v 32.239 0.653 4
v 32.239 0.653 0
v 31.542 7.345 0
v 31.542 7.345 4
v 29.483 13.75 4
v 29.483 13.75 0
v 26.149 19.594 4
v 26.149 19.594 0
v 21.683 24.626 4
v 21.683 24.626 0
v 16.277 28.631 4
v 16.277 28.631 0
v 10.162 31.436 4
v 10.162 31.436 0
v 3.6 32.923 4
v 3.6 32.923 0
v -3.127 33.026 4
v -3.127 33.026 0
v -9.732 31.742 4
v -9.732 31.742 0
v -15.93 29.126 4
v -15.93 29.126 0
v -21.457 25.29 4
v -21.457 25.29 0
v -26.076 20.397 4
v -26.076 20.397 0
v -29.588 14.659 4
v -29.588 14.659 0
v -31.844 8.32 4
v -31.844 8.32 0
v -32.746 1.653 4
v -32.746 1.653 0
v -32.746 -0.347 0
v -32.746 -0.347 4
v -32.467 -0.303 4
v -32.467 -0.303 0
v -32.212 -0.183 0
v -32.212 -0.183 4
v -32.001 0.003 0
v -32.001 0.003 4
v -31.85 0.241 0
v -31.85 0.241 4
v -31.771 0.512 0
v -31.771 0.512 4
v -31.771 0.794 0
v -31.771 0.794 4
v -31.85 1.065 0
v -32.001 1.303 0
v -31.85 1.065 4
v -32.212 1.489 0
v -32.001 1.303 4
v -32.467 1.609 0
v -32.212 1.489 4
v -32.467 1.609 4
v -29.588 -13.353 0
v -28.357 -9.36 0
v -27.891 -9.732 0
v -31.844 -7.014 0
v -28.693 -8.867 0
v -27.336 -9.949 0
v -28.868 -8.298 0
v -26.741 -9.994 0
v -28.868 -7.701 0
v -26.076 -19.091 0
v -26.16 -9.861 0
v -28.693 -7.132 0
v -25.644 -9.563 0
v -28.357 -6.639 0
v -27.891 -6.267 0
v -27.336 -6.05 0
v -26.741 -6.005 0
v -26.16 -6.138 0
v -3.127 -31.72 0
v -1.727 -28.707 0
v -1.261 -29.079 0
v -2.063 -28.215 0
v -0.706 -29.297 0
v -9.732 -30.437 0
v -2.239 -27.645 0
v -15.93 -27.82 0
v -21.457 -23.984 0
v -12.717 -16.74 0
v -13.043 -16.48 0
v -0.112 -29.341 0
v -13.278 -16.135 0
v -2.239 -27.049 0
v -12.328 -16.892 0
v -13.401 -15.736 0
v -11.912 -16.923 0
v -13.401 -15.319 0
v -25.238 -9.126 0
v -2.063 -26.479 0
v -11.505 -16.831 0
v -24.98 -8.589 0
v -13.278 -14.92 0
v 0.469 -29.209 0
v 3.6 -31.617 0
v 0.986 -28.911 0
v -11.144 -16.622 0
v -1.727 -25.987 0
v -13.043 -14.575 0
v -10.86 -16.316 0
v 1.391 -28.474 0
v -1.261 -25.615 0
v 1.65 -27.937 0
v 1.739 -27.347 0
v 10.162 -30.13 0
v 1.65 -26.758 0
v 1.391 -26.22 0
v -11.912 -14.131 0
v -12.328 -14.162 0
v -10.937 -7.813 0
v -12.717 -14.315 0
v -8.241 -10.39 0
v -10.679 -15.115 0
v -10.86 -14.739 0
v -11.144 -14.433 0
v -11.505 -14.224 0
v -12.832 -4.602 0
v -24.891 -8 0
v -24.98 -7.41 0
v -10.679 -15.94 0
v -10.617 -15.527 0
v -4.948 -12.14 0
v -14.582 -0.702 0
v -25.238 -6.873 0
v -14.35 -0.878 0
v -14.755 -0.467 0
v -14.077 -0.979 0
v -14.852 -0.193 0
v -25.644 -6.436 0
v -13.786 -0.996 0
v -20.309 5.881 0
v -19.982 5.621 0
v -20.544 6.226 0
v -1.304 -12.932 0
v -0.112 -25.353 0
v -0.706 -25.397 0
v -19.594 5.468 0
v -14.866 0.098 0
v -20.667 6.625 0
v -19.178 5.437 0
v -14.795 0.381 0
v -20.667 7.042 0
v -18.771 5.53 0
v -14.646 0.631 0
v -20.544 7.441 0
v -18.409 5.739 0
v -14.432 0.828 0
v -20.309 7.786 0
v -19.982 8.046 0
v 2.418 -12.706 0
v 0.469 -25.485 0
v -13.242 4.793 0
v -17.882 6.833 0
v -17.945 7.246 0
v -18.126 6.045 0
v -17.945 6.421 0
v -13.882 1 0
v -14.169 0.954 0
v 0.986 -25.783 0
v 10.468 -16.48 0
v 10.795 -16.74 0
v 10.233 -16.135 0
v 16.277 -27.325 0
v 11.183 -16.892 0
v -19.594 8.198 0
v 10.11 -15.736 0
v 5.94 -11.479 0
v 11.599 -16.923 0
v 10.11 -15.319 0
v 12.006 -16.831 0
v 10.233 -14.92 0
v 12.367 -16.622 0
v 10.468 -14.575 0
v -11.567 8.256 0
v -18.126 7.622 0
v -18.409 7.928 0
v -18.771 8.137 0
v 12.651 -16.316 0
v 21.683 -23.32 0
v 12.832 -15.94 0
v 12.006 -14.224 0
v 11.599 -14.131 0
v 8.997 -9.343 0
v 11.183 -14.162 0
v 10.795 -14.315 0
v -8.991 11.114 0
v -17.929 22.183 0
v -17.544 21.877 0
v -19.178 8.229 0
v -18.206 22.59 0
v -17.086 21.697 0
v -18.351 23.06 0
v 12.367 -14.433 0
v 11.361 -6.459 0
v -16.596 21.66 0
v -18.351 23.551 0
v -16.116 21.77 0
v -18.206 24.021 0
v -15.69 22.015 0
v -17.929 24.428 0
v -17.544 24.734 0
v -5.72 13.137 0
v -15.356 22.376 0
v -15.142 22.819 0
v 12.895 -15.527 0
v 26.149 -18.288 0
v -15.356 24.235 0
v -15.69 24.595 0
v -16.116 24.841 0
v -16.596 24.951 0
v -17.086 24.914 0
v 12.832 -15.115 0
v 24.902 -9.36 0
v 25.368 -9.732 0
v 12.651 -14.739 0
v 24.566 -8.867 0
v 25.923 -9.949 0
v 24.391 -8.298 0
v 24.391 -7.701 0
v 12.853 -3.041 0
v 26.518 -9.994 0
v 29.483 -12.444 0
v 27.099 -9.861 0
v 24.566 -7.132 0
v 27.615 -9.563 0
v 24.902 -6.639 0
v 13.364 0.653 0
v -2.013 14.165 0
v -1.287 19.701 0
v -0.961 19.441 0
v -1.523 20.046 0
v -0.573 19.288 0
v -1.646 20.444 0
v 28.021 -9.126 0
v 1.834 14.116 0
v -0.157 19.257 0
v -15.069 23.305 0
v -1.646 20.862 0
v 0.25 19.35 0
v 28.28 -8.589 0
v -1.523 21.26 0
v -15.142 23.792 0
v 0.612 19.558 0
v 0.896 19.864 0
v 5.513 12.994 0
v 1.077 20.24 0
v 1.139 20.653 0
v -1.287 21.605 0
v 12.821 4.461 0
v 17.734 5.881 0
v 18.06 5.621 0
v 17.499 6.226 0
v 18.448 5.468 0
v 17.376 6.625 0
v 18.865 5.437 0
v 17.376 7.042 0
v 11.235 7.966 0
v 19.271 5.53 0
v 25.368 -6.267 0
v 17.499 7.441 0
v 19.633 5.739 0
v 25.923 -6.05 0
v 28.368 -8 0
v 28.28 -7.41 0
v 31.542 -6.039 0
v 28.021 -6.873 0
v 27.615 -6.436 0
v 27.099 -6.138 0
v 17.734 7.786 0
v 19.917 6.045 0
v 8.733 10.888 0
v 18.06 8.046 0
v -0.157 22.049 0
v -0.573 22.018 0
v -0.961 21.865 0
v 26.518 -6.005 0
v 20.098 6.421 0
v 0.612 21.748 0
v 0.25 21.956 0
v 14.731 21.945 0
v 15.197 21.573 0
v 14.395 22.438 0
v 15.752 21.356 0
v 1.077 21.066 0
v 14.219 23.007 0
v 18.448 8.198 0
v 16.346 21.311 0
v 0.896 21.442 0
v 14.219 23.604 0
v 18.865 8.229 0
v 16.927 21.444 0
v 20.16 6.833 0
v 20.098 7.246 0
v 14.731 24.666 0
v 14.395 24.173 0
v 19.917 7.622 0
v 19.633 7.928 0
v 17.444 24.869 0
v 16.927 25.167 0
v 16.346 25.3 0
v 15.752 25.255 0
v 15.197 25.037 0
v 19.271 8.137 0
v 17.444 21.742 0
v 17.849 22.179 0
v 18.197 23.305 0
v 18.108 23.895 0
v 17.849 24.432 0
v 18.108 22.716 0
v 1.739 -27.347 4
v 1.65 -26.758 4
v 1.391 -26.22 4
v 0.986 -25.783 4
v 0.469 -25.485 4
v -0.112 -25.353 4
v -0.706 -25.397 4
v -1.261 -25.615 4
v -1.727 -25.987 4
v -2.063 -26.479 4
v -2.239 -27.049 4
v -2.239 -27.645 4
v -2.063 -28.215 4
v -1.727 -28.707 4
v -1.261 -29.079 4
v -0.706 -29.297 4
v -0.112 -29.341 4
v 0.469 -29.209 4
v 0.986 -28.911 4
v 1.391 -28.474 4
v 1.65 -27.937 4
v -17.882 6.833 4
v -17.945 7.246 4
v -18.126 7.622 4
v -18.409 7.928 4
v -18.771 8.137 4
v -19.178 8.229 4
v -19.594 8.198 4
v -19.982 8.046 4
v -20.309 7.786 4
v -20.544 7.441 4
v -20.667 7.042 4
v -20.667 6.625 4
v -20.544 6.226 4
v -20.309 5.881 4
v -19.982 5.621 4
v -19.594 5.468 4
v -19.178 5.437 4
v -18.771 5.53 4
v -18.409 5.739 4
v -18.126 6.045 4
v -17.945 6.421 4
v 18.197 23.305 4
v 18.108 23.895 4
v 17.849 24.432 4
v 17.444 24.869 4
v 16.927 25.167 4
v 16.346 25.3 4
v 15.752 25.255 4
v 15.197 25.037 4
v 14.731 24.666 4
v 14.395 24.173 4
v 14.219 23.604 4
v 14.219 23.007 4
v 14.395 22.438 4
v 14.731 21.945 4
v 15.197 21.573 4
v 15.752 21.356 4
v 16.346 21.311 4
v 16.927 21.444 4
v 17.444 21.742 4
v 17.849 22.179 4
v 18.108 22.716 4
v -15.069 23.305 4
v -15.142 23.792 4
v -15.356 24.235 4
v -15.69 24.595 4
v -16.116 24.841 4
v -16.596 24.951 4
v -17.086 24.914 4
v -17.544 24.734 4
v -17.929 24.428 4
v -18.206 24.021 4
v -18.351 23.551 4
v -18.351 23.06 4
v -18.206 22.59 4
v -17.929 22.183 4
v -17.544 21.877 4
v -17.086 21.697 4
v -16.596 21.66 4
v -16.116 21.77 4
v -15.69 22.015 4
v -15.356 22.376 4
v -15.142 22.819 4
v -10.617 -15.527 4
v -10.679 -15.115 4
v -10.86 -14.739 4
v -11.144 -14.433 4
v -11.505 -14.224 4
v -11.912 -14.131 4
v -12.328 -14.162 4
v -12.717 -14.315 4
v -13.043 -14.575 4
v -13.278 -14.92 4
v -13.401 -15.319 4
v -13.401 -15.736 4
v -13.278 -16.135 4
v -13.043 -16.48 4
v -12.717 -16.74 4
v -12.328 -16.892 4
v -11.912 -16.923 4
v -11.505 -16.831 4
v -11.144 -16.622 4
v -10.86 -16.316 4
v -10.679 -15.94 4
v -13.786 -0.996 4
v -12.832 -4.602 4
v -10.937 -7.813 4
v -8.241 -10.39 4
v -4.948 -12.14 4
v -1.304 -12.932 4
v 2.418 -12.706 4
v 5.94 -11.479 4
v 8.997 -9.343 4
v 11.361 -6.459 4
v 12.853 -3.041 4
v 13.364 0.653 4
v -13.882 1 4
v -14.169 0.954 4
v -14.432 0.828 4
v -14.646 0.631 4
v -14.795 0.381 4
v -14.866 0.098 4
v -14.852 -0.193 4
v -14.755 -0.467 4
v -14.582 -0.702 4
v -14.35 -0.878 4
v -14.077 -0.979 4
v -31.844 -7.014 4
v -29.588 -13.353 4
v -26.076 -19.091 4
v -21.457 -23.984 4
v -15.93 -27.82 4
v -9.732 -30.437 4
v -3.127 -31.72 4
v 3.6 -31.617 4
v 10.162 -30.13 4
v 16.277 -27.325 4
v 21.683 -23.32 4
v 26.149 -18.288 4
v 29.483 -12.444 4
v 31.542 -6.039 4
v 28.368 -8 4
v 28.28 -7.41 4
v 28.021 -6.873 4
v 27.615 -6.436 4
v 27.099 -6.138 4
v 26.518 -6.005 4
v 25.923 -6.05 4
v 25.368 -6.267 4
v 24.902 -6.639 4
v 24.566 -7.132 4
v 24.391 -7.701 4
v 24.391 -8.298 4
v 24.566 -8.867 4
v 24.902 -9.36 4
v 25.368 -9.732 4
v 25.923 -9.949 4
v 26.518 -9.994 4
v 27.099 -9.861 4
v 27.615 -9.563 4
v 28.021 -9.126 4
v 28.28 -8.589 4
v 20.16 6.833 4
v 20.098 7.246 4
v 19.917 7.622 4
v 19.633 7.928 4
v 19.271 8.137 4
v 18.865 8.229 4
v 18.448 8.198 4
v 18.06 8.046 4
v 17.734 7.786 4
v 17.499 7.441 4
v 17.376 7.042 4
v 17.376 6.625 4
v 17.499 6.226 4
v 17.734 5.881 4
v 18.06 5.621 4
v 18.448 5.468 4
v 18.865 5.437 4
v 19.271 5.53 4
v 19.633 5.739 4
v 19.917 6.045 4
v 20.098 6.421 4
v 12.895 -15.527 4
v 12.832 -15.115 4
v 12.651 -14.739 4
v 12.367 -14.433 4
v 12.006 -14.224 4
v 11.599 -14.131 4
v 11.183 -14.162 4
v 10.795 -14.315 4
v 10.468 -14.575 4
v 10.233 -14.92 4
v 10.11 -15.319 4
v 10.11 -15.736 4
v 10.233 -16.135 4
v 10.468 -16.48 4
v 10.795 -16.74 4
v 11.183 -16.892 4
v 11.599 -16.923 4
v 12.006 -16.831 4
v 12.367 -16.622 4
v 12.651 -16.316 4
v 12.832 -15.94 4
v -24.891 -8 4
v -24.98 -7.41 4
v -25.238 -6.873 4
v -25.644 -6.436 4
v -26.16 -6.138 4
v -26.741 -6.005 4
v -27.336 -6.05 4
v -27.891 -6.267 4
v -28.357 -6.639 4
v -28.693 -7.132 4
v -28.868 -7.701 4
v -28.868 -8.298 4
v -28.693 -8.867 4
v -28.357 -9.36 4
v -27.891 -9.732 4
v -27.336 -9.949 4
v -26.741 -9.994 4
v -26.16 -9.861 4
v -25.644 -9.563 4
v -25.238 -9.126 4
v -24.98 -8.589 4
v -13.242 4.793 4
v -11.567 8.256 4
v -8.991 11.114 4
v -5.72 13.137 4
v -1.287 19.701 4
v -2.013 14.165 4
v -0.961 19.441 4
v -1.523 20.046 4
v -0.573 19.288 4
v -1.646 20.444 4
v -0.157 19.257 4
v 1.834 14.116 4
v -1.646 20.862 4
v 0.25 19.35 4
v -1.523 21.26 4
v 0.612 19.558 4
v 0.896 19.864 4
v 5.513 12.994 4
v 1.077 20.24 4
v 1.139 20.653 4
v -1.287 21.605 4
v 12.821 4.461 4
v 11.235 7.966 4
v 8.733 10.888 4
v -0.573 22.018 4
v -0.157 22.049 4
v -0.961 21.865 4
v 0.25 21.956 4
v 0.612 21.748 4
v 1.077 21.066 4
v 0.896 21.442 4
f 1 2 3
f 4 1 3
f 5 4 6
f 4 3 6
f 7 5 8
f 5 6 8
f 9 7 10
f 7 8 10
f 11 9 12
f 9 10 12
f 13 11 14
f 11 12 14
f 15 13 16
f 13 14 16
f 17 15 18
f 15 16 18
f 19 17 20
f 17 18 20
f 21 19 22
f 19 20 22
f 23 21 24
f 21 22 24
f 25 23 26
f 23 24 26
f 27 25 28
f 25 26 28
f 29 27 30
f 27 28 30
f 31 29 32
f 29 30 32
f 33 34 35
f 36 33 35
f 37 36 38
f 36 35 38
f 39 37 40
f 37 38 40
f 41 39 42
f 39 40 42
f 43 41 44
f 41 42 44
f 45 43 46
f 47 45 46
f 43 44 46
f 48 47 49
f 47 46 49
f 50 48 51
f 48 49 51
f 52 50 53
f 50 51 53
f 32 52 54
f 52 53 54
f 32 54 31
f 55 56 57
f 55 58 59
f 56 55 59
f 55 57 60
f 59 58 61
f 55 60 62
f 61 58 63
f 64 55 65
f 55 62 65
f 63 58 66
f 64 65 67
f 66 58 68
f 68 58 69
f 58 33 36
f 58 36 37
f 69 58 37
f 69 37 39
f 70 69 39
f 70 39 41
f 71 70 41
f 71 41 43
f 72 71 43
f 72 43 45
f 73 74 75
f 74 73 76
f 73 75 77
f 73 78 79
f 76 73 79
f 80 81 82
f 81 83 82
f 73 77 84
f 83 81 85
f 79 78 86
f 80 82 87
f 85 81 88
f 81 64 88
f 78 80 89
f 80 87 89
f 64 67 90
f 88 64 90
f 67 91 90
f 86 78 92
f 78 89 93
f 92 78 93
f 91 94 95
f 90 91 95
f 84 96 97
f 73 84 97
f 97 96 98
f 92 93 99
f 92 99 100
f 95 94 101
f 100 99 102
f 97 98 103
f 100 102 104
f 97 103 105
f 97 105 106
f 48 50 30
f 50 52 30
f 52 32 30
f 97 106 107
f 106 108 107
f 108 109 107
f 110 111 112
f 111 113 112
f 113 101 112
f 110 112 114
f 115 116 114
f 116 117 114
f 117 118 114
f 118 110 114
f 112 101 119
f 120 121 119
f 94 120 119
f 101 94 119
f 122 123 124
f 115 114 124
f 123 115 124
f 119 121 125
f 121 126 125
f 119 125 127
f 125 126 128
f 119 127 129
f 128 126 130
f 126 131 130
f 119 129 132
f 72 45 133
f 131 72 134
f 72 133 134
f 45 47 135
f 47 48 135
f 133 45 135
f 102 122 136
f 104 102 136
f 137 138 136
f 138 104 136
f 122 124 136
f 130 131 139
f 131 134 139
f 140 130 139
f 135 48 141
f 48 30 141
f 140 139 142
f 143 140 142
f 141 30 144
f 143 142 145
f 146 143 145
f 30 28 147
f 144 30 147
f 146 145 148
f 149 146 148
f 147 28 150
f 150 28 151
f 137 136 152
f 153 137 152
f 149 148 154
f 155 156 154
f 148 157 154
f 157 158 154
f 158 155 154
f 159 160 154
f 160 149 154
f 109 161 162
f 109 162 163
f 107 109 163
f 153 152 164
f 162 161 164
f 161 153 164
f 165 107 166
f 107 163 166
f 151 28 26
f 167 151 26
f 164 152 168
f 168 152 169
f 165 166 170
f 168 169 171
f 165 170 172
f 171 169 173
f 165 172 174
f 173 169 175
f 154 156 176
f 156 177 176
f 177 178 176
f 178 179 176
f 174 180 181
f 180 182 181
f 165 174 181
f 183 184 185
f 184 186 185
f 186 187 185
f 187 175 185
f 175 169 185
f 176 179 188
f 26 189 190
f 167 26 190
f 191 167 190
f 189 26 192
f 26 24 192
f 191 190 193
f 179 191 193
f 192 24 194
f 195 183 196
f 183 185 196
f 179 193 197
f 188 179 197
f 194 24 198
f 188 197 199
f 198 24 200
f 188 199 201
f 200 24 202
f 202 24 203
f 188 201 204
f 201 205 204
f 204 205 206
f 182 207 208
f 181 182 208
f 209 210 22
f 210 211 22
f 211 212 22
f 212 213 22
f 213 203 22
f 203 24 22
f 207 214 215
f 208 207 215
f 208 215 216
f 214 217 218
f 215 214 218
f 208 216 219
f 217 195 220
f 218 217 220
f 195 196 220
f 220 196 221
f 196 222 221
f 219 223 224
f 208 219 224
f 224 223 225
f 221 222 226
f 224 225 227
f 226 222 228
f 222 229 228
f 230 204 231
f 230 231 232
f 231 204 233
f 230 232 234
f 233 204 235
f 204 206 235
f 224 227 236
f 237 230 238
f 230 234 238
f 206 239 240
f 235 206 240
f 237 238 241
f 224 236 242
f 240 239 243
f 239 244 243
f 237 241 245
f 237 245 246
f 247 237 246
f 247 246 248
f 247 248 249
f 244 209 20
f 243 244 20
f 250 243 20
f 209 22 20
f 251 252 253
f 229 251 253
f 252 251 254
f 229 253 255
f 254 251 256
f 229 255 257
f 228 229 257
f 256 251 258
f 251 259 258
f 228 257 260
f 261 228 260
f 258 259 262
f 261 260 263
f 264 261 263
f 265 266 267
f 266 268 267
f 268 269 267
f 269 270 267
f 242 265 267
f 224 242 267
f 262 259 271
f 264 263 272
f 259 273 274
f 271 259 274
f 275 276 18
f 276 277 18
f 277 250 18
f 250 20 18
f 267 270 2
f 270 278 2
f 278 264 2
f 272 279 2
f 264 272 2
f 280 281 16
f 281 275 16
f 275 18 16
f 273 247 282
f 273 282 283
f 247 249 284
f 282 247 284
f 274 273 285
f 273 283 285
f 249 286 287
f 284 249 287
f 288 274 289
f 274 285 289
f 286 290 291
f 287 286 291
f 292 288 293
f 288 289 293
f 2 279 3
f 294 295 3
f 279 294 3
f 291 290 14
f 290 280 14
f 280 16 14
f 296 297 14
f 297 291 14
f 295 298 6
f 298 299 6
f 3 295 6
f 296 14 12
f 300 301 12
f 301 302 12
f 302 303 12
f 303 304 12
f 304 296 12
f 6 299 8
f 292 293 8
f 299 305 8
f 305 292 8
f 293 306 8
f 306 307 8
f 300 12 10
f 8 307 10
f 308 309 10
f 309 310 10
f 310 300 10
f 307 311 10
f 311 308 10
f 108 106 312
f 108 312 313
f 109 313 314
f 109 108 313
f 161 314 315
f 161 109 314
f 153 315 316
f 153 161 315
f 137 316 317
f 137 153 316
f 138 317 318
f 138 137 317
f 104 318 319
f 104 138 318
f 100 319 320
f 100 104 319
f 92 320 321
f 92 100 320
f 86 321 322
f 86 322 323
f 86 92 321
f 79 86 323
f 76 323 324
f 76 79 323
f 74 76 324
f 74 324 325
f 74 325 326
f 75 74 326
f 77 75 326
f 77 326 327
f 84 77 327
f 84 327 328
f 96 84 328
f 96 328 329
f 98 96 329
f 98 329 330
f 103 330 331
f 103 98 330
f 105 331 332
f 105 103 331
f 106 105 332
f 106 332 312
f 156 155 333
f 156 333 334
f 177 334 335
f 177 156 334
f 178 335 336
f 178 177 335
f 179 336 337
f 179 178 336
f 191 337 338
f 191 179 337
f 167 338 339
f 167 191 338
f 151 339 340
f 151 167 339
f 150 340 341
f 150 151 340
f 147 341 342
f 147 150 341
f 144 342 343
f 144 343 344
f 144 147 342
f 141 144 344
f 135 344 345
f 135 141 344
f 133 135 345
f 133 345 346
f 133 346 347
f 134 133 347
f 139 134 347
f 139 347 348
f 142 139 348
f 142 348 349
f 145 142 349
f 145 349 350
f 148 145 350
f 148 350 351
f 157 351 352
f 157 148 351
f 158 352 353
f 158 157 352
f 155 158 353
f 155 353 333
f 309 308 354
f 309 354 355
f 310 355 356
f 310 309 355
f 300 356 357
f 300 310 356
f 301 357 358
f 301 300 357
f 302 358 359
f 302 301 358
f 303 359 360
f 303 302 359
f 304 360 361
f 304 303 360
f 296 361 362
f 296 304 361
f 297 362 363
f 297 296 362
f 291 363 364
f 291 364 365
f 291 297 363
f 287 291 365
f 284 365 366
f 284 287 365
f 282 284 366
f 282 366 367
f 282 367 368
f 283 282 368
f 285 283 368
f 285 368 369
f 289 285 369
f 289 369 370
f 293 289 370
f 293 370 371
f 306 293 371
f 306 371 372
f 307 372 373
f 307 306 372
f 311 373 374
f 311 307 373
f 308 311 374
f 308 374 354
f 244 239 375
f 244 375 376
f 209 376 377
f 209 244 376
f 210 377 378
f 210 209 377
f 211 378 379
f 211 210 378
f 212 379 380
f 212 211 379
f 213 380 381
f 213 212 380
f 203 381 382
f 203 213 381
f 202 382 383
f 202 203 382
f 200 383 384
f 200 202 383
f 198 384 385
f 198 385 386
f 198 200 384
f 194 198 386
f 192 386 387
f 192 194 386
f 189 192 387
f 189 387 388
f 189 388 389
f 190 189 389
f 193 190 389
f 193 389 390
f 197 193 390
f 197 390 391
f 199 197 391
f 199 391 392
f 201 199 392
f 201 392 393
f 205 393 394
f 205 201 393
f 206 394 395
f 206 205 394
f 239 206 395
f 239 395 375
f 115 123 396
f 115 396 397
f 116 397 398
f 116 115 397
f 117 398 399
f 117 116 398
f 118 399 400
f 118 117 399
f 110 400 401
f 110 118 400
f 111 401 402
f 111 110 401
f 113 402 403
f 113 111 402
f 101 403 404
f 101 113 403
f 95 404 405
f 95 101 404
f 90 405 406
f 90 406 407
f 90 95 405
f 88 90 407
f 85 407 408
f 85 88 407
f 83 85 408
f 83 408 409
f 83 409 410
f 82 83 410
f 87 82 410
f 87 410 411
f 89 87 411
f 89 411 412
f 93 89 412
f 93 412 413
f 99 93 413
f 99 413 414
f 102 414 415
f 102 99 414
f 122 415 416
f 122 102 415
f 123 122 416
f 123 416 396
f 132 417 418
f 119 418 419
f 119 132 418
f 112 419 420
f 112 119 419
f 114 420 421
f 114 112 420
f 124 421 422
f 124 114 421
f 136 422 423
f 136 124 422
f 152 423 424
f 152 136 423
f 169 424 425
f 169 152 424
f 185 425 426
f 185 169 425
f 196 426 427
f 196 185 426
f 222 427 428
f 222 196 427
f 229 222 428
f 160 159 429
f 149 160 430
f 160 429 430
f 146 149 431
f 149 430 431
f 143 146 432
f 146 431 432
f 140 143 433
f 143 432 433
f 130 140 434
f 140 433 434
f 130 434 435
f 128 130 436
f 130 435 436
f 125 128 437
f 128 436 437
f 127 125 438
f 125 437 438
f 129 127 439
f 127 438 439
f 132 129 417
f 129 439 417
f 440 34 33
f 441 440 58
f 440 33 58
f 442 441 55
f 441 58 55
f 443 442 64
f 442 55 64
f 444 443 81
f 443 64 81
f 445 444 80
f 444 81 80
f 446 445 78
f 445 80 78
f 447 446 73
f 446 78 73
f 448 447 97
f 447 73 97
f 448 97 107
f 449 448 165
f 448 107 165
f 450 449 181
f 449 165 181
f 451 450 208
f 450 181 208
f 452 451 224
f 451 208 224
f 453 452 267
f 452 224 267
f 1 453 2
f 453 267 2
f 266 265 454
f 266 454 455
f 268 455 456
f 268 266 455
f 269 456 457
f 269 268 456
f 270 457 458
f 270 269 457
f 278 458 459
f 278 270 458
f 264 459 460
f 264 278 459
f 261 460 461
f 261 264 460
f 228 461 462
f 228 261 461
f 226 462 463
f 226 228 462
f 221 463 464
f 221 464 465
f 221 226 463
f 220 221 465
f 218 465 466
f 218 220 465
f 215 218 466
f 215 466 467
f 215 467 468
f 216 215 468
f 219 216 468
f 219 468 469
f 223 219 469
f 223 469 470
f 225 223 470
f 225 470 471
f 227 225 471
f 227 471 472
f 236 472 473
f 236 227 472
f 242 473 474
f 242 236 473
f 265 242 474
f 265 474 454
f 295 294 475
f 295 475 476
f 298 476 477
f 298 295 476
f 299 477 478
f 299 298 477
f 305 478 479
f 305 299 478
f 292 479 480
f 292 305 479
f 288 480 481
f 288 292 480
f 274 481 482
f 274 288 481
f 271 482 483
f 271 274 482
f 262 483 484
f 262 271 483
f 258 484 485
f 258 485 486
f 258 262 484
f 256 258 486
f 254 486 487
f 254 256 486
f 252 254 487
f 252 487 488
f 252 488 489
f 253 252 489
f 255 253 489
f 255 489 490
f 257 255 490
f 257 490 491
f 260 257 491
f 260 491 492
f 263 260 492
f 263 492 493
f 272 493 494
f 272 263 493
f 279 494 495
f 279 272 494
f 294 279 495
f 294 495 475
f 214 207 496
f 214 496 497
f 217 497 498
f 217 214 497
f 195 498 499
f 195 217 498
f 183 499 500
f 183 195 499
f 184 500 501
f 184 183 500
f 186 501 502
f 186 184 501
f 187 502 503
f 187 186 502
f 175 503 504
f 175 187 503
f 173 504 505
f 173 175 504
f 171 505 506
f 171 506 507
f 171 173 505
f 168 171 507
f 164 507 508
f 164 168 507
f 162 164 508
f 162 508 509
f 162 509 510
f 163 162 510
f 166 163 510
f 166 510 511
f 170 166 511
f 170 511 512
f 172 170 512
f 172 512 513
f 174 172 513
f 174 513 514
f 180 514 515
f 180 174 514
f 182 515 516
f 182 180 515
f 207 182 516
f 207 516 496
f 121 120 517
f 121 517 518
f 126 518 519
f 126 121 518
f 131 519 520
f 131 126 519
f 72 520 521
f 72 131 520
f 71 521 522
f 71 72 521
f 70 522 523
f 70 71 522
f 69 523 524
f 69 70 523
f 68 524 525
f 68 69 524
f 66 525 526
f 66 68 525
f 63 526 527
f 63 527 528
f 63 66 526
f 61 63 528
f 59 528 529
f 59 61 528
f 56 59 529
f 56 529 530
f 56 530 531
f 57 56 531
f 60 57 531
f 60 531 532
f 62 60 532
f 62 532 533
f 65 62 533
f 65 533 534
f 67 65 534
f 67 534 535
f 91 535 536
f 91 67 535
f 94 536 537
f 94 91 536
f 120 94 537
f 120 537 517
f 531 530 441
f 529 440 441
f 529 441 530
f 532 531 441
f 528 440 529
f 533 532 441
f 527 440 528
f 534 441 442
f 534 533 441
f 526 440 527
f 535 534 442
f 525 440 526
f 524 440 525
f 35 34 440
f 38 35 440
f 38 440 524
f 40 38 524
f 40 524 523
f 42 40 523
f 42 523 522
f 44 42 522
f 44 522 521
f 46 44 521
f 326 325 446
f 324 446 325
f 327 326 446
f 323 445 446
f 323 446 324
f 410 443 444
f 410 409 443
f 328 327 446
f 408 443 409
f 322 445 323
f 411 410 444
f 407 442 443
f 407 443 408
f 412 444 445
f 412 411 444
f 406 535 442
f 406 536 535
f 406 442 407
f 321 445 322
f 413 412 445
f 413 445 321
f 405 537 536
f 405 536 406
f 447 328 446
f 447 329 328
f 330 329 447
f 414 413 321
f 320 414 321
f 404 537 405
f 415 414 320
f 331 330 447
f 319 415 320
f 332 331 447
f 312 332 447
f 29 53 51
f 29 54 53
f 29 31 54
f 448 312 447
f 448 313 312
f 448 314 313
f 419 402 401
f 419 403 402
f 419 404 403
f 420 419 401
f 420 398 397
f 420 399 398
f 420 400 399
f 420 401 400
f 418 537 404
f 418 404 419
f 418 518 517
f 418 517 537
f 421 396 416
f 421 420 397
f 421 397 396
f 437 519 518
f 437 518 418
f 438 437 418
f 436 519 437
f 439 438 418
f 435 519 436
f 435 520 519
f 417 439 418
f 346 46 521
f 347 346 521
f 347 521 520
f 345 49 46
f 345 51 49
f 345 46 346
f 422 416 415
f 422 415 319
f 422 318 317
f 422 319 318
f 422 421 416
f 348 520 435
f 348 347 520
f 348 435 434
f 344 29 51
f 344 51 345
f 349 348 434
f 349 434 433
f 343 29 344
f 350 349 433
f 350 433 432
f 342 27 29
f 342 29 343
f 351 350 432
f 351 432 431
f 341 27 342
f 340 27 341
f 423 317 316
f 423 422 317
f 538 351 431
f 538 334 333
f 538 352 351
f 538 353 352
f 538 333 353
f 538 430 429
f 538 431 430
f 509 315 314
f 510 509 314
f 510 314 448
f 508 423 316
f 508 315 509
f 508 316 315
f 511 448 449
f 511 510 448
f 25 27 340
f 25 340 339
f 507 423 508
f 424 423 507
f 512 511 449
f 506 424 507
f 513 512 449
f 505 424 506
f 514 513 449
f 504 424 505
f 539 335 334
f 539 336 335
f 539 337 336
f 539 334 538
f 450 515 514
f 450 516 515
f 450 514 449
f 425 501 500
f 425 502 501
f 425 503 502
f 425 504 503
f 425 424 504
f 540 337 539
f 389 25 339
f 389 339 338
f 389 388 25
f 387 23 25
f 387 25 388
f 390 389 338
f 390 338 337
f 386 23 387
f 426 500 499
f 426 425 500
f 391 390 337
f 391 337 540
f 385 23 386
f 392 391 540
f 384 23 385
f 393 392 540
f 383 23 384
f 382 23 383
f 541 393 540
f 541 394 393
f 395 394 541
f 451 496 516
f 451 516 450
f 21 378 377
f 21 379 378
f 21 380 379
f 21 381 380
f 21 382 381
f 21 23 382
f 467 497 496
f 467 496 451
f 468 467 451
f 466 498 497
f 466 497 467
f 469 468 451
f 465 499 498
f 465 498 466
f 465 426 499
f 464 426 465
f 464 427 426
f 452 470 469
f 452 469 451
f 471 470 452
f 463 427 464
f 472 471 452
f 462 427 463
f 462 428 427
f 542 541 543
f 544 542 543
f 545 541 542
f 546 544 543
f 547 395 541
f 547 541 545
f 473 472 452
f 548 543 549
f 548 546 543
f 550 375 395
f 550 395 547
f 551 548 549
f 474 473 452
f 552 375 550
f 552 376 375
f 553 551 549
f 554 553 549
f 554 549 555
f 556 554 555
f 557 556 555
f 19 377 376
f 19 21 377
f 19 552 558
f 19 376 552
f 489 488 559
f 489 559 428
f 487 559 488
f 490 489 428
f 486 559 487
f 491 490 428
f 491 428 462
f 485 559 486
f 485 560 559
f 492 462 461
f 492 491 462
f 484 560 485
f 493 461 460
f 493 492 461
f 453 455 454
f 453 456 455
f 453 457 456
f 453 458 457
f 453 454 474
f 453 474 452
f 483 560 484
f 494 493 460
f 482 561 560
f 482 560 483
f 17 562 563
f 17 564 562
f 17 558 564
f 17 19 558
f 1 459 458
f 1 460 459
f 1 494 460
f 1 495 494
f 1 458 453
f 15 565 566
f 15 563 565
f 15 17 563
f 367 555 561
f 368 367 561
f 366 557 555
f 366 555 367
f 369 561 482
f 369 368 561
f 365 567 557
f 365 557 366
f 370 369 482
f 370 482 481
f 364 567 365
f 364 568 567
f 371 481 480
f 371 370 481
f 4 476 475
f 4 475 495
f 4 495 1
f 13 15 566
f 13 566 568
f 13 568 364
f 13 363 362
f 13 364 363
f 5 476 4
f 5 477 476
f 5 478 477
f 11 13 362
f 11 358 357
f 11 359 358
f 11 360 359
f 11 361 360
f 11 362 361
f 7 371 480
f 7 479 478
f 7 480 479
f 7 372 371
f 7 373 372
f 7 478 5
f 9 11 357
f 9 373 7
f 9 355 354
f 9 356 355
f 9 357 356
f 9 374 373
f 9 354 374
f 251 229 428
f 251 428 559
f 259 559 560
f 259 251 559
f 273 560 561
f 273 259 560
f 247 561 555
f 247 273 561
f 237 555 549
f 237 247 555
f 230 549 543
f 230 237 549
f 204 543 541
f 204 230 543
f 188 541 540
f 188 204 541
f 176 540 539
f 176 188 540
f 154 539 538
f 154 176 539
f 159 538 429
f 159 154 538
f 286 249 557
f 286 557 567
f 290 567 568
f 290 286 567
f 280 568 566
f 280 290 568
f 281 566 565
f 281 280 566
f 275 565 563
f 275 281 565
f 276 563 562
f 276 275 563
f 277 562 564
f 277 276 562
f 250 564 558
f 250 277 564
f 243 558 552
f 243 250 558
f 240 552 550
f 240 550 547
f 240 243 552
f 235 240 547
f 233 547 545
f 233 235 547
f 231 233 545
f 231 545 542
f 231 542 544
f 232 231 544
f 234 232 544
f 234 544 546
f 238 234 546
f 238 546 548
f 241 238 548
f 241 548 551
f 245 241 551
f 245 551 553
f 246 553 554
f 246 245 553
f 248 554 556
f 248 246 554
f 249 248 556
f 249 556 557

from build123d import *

# Parameters (mm, degrees)
SKETCH_1_R          = 32.5
SKETCH_1_R_2        = 13.625
SKETCH_1_R_3        = 2
SKETCH_1_R_4        = 1.65
SKETCH_1_R_5        = 1.4
EXTRUDE_1_DEPTH     = 4
SKETCH_2_R          = 1
CUT_EXTRUDE_1_DEPTH = 10


with BuildPart() as part:
    # 草图1 → 凸台-拉伸1 (new body)
    with BuildSketch(Plane.XY):
        with Locations((-0.261189045, 0.652972612)):
            Circle(SKETCH_1_R)
        with Locations((-0.261189045, 0.652972612)):
            Circle(SKETCH_1_R_2, mode=Mode.SUBTRACT)
        with Locations((-0.261189045, -27.347027388)):
            Circle(SKETCH_1_R_3, mode=Mode.SUBTRACT)
        with Locations((-26.890771501, -7.999503231)):
            Circle(SKETCH_1_R_3, mode=Mode.SUBTRACT)
        with Locations((-16.719176109, 23.305448454)):
            Circle(SKETCH_1_R_4, mode=Mode.SUBTRACT)
        with Locations((16.196798019, 23.305448454)):
            Circle(SKETCH_1_R_3, mode=Mode.SUBTRACT)
        with Locations((26.368393412, -7.999503231)):
            Circle(SKETCH_1_R_3, mode=Mode.SUBTRACT)
        with Locations((-12.016894091, -15.527367276)):
            Circle(SKETCH_1_R_5, mode=Mode.SUBTRACT)
        with Locations((-19.282319371, 6.833312499)):
            Circle(SKETCH_1_R_5, mode=Mode.SUBTRACT)
        with Locations((-0.261189045, 20.652972612)):
            Circle(SKETCH_1_R_5, mode=Mode.SUBTRACT)
        with Locations((18.759941281, 6.833312499)):
            Circle(SKETCH_1_R_5, mode=Mode.SUBTRACT)
        with Locations((11.494516001, -15.527367276)):
            Circle(SKETCH_1_R_5, mode=Mode.SUBTRACT)
    extrude(amount=EXTRUDE_1_DEPTH)

    # 草图2 → 切除-拉伸1 (cut)
    with BuildSketch(Plane.XY.offset(4)):
        with Locations((-13.870533326, 0)):
            Circle(SKETCH_2_R)
        with Locations((-32.761189045, 0.652972612)):
            Circle(SKETCH_2_R)
    extrude(amount=-CUT_EXTRUDE_1_DEPTH, mode=Mode.SUBTRACT)


solid = part.part
